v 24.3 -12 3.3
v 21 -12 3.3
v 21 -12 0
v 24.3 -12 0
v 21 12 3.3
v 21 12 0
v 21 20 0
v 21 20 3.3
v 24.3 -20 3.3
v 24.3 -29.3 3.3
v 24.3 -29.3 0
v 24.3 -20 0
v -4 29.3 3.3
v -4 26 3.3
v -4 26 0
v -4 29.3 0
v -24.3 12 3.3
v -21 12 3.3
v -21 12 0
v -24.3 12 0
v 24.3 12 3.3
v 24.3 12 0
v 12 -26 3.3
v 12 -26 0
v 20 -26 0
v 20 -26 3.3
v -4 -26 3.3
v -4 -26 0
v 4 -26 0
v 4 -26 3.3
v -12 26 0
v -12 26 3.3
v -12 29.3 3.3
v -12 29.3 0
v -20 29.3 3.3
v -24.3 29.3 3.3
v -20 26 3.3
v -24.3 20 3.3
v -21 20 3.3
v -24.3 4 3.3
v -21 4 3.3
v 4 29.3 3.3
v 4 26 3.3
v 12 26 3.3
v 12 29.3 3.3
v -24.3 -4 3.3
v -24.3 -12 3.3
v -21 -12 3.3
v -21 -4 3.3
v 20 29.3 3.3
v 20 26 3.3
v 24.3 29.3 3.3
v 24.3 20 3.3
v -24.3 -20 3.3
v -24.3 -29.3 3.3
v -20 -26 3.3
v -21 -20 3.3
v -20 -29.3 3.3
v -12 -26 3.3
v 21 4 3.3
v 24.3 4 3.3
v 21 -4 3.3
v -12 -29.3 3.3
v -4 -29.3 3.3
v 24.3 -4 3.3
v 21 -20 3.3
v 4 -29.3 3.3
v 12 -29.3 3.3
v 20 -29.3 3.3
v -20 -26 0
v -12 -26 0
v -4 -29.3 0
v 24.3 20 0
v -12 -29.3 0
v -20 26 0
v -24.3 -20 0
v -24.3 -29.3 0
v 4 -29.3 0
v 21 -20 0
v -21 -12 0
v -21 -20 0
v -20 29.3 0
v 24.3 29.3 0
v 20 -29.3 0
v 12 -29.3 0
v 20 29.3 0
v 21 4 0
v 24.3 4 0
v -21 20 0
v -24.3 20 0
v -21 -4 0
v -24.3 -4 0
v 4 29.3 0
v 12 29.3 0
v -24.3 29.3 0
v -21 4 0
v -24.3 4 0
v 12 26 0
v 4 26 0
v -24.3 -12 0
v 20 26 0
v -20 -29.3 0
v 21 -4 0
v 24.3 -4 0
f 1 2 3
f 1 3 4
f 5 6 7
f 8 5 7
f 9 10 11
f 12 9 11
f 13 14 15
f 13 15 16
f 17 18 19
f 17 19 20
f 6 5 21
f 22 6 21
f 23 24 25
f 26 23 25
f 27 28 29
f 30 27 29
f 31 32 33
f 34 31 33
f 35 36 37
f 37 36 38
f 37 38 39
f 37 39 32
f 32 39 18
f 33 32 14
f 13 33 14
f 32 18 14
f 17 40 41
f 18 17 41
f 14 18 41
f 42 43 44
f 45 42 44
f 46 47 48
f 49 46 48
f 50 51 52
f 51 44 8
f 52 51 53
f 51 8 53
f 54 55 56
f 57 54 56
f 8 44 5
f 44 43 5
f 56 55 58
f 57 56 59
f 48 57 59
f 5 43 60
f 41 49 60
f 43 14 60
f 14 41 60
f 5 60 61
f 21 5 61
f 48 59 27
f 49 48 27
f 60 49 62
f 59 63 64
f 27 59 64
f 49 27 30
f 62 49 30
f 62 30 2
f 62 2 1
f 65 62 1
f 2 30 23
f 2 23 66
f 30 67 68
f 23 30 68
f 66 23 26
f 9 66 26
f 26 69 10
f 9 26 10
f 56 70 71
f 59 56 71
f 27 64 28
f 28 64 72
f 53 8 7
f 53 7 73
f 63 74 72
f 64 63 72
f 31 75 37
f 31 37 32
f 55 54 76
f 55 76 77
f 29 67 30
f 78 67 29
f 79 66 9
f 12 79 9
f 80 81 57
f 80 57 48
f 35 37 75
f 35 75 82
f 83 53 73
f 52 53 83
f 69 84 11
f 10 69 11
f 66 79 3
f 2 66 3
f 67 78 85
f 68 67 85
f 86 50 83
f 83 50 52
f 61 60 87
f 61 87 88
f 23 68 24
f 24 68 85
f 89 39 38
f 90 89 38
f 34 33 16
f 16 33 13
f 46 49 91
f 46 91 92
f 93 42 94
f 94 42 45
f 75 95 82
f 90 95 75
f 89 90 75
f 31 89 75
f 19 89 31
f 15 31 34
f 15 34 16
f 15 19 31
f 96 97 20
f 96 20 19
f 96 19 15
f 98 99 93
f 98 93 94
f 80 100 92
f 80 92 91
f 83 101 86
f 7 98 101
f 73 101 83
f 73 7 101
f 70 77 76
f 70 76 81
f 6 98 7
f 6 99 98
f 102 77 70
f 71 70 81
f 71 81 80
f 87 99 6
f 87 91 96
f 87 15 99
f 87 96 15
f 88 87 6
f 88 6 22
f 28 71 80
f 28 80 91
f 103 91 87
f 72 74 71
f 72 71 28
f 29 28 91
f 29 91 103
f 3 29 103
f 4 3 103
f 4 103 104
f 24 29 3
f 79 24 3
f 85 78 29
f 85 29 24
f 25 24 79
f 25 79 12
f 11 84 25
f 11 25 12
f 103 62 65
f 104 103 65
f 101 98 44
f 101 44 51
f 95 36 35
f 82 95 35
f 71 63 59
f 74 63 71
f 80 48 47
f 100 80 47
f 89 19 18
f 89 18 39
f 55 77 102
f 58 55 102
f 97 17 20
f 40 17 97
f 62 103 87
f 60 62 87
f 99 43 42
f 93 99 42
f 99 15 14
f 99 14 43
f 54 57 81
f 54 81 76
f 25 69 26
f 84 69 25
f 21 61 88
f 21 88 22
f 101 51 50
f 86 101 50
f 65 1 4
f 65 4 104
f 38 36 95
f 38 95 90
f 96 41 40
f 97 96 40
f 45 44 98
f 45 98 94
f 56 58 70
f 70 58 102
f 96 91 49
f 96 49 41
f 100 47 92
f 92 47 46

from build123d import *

# Parameters (mm, degrees)
ESQUISSE1_W                    = 42
ESQUISSE1_H                    = 52
BOSS_EXTRU_1_DEPTH             = 3.3
ESQUISSE3_W                    = 3.3
ESQUISSE3_H                    = 8
BOSS_EXTRU_2_DEPTH             = 3.3
R_P_TITION_LIN_AIRE1_COUNT     = 3
R_P_TITION_LIN_AIRE1_PITCH     = 16
R_P_TITION_LIN_AIRE1_COL_COUNT = 2
R_P_TITION_LIN_AIRE1_COL_PITCH = 16
SYM_TRIE1_COPY_1_SKETCH_W      = 3.3
SYM_TRIE1_COPY_1_SKETCH_H      = 8
SYM_TRIE1_COPY_1_DEPTH         = 3.3
SYM_TRIE1_COPY_2_SKETCH_W      = 3.3
SYM_TRIE1_COPY_2_SKETCH_H      = 8
SYM_TRIE1_COPY_2_DEPTH         = 3.3
SYM_TRIE1_COPY_3_SKETCH_W      = 3.3
SYM_TRIE1_COPY_3_SKETCH_H      = 8
SYM_TRIE1_COPY_3_DEPTH         = 3.3
ESQUISSE4_W                    = 8
ESQUISSE4_H                    = 3.3
BOSS_EXTRU_3_DEPTH             = 3.3
R_P_TITION_LIN_AIRE2_COUNT     = 3
R_P_TITION_LIN_AIRE2_PITCH     = 16
R_P_TITION_LIN_AIRE2_COL_COUNT = 2
R_P_TITION_LIN_AIRE2_COL_PITCH = 16
ESQUISSE5_W                    = 3.7
ESQUISSE5_H                    = 3.3
ENL_V_MAT_EXTRU_1_DEPTH        = 41.661775662
SYM_TRIE2_START                = -29.3
SYM_TRIE2_OUTLINE_W            = 4.3
SYM_TRIE2_OUTLINE_H            = 3.3
SYM_TRIE2_OUTLINE_W_2          = 8
SYM_TRIE2_DEPTH                = 3.3


# Read off the part's stored shape, not the designer's step: Symétrie2
with BuildPart() as part:
    # Esquisse1 → Boss.-Extru.1 (new body)
    with BuildSketch(Plane.XY):
        Rectangle(ESQUISSE1_W, ESQUISSE1_H)
    extrude(amount=BOSS_EXTRU_1_DEPTH)

    # Esquisse3 → Boss.-Extru.2 (add)
    with BuildSketch(Plane.XY.offset(3.3)):
        with Locations((22.65, -8)):
            Rectangle(ESQUISSE3_W, ESQUISSE3_H)
    boss_extru_2 = extrude(amount=-BOSS_EXTRU_2_DEPTH)

    # Répétition linéaire1: Boss.-Extru.2 ×3
    with Locations(*[(0, i * R_P_TITION_LIN_AIRE1_PITCH, 0) for i in range(1, R_P_TITION_LIN_AIRE1_COUNT)]):
        add(boss_extru_2)

    # Répétition linéaire1 col: Boss.-Extru.2 ×2
    with Locations(*[(0, -i * R_P_TITION_LIN_AIRE1_COL_PITCH, 0) for i in range(1, R_P_TITION_LIN_AIRE1_COL_COUNT)]):
        add(boss_extru_2)

    # Symétrie1: Boss.-Extru.2 across plane
    add(boss_extru_2.mirror(Plane(origin=(0, 0, 0), x_dir=(0, 0, 1), z_dir=(1, 0, 0))))

    # Symétrie1 copy 1 sketch → Symétrie1 copy 1 (add)
    with BuildSketch(Plane(origin=(0, 16, 3.3), x_dir=(-1, 0, 0), z_dir=(0, 0, 1))):
        with Locations((22.65, 8)):
            Rectangle(SYM_TRIE1_COPY_1_SKETCH_W, SYM_TRIE1_COPY_1_SKETCH_H)
    extrude(amount=-SYM_TRIE1_COPY_1_DEPTH)

    # Symétrie1 copy 2 sketch → Symétrie1 copy 2 (add)
    with BuildSketch(Plane(origin=(0, 32, 3.3), x_dir=(-1, 0, 0), z_dir=(0, 0, 1))):
        with Locations((22.65, 8)):
            Rectangle(SYM_TRIE1_COPY_2_SKETCH_W, SYM_TRIE1_COPY_2_SKETCH_H)
    extrude(amount=-SYM_TRIE1_COPY_2_DEPTH)

    # Symétrie1 copy 3 sketch → Symétrie1 copy 3 (add)
    with BuildSketch(Plane(origin=(0, -16, 3.3), x_dir=(-1, 0, 0), z_dir=(0, 0, 1))):
        with Locations((22.65, 8)):
            Rectangle(SYM_TRIE1_COPY_3_SKETCH_W, SYM_TRIE1_COPY_3_SKETCH_H)
    extrude(amount=-SYM_TRIE1_COPY_3_DEPTH)

    # Esquisse4 → Boss.-Extru.3 (add)
    with BuildSketch(Plane.XY.offset(3.3)):
        with Locations((-8, 27.65)):
            Rectangle(ESQUISSE4_W, ESQUISSE4_H)
    boss_extru_3 = extrude(amount=-BOSS_EXTRU_3_DEPTH)

    # Répétition linéaire2: Boss.-Extru.3 ×3
    with Locations(*[(i * R_P_TITION_LIN_AIRE2_PITCH, 0, 0) for i in range(1, R_P_TITION_LIN_AIRE2_COUNT)]):
        add(boss_extru_3)

    # Répétition linéaire2 col: Boss.-Extru.3 ×2
    with Locations(*[(-i * R_P_TITION_LIN_AIRE2_COL_PITCH, 0, 0) for i in range(1, R_P_TITION_LIN_AIRE2_COL_COUNT)]):
        add(boss_extru_3)

    # Esquisse5 → Enlèv. mat.-Extru.1 (cut, symmetric)
    with BuildSketch(Plane.XY.offset(3.3)):
        with Locations((-26.15, 27.65)):
            Rectangle(ESQUISSE5_W, ESQUISSE5_H)
        with Locations((26.15, 27.65)):
            Rectangle(ESQUISSE5_W, ESQUISSE5_H)
    extrude(amount=ENL_V_MAT_EXTRU_1_DEPTH, both=True, mode=Mode.SUBTRACT)

    # Symétrie2 outline → Symétrie2 (add)
    with BuildSketch(Plane(origin=(0, 0, 0), x_dir=(1, 0, 0), z_dir=(0, 1, 0)).offset(SYM_TRIE2_START)):
        with Locations((22.15, -1.65)):
            Rectangle(SYM_TRIE2_OUTLINE_W, SYM_TRIE2_OUTLINE_H)
        with Locations((8, -1.65)):
            Rectangle(SYM_TRIE2_OUTLINE_W_2, SYM_TRIE2_OUTLINE_H)
        with Locations((-8, -1.65)):
            Rectangle(SYM_TRIE2_OUTLINE_W_2, SYM_TRIE2_OUTLINE_H)
        with Locations((-22.15, -1.65)):
            Rectangle(SYM_TRIE2_OUTLINE_W, SYM_TRIE2_OUTLINE_H)
    extrude(amount=SYM_TRIE2_DEPTH)


solid = part.part
